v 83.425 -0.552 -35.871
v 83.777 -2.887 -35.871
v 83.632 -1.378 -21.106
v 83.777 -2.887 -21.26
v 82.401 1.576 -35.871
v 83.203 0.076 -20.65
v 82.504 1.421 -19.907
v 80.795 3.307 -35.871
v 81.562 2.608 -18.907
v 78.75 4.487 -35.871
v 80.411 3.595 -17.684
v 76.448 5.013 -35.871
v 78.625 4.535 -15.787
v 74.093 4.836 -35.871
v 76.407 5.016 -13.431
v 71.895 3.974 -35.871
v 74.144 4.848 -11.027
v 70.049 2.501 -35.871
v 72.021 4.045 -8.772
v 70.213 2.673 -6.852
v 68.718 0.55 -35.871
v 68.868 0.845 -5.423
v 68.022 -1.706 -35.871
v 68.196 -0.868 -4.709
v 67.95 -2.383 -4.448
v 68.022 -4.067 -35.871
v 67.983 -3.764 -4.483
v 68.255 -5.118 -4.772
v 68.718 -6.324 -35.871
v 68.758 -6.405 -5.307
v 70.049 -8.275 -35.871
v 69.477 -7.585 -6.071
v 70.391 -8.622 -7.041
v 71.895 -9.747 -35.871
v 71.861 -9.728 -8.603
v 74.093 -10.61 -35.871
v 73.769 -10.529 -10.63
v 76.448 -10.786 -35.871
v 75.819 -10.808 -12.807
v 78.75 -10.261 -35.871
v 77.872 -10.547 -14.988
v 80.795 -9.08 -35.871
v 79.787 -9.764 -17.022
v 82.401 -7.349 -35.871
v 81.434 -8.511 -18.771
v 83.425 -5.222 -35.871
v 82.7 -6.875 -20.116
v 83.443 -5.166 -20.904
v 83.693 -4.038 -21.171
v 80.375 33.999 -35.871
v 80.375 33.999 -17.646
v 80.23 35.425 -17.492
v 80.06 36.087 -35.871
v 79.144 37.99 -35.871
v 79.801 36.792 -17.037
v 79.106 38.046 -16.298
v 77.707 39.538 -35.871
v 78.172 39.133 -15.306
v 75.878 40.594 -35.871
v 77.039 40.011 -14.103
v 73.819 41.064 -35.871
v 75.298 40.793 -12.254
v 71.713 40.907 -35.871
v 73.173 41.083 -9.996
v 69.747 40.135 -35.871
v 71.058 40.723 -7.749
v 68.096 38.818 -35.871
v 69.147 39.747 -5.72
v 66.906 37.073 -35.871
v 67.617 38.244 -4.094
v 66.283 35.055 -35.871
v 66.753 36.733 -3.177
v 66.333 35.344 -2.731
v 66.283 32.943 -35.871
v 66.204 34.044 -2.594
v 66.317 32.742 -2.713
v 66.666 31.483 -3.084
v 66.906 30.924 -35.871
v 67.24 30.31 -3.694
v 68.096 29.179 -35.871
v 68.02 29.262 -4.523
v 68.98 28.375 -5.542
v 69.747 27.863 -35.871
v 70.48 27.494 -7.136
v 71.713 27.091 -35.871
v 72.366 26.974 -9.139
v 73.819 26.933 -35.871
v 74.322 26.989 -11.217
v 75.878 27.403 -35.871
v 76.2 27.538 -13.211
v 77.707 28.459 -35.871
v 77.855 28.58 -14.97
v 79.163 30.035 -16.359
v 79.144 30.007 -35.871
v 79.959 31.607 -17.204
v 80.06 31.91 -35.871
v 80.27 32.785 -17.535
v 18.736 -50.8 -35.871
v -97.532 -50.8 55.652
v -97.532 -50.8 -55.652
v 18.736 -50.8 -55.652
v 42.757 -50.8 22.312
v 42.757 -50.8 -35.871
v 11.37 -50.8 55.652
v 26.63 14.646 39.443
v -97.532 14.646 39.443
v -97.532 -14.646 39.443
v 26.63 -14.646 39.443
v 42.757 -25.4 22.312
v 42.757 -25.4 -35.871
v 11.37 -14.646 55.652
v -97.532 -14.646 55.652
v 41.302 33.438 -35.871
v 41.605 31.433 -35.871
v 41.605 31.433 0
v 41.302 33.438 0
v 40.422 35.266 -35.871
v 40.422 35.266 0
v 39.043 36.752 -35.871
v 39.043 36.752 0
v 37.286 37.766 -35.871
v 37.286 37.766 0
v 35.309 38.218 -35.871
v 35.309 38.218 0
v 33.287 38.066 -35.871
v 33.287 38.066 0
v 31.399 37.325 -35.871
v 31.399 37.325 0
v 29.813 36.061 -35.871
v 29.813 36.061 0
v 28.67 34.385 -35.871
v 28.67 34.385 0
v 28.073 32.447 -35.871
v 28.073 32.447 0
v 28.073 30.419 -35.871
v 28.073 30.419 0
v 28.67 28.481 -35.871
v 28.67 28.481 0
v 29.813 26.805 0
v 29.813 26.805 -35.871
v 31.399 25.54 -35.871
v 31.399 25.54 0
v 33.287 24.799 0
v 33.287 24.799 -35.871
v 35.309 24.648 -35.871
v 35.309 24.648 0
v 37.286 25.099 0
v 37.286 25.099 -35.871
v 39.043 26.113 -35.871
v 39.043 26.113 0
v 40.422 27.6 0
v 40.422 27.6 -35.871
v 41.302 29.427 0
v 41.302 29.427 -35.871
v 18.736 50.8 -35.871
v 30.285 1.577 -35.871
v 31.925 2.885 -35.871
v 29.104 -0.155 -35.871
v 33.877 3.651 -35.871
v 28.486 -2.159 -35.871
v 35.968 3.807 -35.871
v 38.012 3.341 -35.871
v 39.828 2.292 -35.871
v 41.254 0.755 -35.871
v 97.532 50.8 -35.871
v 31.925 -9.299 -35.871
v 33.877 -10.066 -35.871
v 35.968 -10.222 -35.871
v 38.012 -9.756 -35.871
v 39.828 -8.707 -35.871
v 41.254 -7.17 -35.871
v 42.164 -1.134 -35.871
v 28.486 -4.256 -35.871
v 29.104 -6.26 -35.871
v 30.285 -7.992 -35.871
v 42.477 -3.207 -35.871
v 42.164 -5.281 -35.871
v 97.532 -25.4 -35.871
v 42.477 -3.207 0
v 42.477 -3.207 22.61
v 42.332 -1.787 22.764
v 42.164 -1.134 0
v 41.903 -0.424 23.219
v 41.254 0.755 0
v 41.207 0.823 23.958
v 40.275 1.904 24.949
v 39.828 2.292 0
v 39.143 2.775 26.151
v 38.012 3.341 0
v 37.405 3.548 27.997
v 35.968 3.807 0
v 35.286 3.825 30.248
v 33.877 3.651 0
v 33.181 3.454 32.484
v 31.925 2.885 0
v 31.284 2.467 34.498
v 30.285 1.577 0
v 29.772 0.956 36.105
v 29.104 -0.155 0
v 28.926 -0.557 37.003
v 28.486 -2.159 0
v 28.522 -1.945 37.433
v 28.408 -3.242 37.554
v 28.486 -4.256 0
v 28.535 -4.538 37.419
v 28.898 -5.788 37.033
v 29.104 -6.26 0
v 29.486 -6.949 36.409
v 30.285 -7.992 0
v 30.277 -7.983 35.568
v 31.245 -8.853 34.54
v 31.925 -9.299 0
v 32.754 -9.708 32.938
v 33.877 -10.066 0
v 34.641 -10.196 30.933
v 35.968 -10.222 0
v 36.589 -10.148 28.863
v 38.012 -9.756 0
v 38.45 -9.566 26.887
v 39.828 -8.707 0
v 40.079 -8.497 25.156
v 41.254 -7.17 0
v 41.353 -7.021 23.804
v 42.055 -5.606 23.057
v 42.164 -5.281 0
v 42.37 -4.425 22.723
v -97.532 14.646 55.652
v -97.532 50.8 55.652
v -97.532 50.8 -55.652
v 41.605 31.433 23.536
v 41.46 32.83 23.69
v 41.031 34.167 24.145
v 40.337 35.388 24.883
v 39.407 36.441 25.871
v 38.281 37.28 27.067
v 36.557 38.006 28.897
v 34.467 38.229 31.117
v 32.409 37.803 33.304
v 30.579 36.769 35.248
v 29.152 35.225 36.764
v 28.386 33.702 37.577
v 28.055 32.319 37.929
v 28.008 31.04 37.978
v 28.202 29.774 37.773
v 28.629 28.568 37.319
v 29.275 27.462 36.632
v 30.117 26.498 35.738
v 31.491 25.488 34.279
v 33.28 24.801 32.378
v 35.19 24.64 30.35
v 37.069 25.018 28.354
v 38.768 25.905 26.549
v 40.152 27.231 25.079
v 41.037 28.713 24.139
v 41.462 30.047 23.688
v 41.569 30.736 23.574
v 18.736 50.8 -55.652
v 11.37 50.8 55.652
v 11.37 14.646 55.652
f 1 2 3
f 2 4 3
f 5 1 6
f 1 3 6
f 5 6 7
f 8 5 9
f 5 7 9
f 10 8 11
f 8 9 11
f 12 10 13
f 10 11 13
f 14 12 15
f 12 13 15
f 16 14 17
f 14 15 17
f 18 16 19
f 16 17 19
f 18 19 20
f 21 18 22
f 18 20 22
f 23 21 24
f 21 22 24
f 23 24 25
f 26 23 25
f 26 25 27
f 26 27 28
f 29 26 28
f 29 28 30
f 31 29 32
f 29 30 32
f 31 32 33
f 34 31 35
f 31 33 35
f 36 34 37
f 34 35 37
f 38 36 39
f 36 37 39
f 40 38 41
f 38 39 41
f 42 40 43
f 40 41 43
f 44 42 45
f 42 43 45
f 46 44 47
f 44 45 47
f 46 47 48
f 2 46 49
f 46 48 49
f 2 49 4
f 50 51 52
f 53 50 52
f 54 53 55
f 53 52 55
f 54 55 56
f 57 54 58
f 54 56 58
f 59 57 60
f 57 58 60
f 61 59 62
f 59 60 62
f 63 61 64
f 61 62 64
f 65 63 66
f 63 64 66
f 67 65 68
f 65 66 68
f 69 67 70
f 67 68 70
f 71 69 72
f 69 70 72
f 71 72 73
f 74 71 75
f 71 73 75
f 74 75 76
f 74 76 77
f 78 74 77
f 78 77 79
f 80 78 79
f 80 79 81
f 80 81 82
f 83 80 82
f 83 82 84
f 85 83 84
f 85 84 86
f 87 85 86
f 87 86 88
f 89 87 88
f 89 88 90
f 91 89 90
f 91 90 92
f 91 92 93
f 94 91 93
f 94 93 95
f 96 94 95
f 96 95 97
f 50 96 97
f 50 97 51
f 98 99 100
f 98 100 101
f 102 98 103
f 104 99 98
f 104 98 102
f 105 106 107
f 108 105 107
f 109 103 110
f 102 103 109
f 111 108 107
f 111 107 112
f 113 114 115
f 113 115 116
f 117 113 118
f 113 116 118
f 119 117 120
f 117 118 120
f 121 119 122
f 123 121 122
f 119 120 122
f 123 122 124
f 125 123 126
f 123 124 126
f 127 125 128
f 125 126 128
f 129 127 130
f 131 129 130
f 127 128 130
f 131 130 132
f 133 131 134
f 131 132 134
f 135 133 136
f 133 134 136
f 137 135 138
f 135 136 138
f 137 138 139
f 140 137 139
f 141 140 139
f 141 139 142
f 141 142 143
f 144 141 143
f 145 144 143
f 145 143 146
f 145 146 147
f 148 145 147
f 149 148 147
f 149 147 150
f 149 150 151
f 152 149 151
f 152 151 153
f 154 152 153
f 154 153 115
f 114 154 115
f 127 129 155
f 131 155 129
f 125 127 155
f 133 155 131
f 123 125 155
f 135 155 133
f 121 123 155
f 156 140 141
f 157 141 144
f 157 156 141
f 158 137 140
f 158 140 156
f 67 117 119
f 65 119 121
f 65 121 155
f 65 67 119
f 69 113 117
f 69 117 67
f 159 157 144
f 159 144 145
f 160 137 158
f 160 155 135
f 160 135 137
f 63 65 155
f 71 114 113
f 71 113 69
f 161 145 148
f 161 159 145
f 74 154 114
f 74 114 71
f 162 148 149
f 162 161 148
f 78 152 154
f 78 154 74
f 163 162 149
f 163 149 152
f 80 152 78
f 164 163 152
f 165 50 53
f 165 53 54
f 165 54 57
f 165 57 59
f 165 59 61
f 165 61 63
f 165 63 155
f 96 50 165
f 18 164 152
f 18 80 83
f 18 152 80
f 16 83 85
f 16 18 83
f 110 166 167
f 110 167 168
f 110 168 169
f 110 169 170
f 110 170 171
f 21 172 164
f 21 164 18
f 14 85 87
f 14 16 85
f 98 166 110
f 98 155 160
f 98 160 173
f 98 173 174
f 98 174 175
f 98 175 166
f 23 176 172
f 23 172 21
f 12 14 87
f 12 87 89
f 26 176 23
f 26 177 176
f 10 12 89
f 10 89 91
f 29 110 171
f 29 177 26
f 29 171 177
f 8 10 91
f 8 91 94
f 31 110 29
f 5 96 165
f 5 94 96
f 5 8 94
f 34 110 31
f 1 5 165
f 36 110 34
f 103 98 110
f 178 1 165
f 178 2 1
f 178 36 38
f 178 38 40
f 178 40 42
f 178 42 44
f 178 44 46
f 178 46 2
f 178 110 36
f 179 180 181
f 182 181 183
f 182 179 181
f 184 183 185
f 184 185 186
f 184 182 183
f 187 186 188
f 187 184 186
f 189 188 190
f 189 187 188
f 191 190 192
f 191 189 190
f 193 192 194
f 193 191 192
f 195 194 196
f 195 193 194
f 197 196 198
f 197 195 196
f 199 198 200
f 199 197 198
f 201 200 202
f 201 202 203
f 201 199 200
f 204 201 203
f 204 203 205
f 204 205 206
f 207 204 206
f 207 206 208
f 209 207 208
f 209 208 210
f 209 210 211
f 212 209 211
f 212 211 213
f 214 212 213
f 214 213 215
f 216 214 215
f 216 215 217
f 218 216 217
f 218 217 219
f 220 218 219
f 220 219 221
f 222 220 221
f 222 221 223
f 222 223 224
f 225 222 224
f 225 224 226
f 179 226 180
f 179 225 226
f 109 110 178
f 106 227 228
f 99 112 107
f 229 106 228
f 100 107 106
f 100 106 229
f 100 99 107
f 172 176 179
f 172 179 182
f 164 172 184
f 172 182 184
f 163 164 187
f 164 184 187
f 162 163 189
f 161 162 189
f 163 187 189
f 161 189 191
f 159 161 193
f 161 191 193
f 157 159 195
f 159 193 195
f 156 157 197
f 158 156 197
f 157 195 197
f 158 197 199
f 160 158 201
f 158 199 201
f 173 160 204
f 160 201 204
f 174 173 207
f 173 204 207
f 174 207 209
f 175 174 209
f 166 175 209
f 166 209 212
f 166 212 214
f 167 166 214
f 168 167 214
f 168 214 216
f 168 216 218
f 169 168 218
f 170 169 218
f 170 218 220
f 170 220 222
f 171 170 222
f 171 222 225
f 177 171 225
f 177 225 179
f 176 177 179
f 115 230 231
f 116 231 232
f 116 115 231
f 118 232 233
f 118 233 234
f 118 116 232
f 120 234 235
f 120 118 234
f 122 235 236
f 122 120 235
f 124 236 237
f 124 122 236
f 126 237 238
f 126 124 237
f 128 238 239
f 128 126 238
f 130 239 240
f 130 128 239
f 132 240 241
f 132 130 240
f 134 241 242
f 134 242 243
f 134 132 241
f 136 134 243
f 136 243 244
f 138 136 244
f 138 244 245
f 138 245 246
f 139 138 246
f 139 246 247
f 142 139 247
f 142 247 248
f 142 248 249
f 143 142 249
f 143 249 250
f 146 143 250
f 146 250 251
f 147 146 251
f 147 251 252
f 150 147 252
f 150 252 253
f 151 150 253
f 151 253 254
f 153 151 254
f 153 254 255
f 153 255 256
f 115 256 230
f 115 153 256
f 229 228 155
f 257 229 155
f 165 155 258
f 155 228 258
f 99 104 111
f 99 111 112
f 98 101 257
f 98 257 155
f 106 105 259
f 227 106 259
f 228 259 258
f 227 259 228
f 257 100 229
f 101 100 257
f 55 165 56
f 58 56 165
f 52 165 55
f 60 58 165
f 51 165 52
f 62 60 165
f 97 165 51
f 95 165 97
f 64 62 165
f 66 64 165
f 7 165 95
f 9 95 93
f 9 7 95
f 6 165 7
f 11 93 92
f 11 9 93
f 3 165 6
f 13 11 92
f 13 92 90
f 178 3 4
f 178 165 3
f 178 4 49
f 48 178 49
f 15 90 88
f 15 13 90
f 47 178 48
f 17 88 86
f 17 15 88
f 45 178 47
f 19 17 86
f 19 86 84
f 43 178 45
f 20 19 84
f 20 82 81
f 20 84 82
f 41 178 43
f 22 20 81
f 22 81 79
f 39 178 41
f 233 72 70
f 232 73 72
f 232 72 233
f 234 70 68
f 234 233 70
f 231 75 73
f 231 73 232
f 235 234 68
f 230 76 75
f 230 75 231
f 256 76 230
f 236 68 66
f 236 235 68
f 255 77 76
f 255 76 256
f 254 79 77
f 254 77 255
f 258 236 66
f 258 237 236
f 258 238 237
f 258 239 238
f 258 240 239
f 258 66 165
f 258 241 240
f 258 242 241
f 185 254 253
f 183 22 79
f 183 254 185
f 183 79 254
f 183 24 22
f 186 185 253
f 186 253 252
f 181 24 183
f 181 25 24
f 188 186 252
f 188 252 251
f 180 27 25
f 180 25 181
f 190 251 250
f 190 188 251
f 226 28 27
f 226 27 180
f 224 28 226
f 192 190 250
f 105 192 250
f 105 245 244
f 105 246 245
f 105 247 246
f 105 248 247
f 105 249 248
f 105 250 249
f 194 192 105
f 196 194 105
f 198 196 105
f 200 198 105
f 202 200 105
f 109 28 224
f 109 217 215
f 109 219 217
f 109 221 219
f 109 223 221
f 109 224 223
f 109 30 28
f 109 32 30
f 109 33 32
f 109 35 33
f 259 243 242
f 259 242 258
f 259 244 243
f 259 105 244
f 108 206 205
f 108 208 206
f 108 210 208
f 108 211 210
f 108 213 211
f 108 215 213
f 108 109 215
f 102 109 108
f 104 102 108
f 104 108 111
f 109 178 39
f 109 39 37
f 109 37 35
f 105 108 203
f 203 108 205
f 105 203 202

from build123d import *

# Parameters (mm, degrees)
F1_DEPTH = 50.8
F2_W     = 55.727891
F2_H     = 82.951285
F3_DEPTH = 25.4
F4_R     = 6.803982
F4_R_2   = 7.03444
F4_R_3   = 7.085439
F4_R_4   = 7.921759
F5_DEPTH = 63.5
F6_W     = 29.292612
F6_H     = 16.20914
F7_DEPTH = 174.244


with BuildPart() as f1:
    # F0 (on Front) → F1 (new body, symmetric)
    with BuildSketch(Plane.XZ):
        Polygon((11.369772, 55.651672), (-97.532384, 55.651672), (-97.532384, -55.651672), (18.7361, -55.651672), (18.7361, -35.870828), (97.532384, -35.870828), align=None)
    extrude(amount=F1_DEPTH, both=True)

    # F2 (on face) → F3 (cut)
    with BuildSketch(Plane.XZ.offset(50.8)):
        with Locations((70.620689, 5.604814)):
            Rectangle(F2_W, F2_H)
    extrude(amount=-F3_DEPTH, mode=Mode.SUBTRACT)

    # F4 (on Top) → F5 (cut, symmetric)
    with BuildSketch(Plane.XY):
        with Locations((34.800593, 31.432793)):
            Circle(F4_R)
        with Locations((35.442077, -3.207429)):
            Circle(F4_R_2)
        with Locations((73.28973, 33.998735)):
            Circle(F4_R_3)
        with Locations((75.855672, -2.886686)):
            Circle(F4_R_4)
    extrude(amount=F5_DEPTH, both=True, mode=Mode.SUBTRACT)

    # F6 (on face) → F7 (cut)
    with BuildSketch(Plane(origin=(-97.532384, 0, 0), x_dir=(0, -1, 0), z_dir=(-1, 0, 0))):
        with Locations((0, 47.547102)):
            Rectangle(F6_W, F6_H)
    extrude(amount=-F7_DEPTH, mode=Mode.SUBTRACT)


solid = f1.part
